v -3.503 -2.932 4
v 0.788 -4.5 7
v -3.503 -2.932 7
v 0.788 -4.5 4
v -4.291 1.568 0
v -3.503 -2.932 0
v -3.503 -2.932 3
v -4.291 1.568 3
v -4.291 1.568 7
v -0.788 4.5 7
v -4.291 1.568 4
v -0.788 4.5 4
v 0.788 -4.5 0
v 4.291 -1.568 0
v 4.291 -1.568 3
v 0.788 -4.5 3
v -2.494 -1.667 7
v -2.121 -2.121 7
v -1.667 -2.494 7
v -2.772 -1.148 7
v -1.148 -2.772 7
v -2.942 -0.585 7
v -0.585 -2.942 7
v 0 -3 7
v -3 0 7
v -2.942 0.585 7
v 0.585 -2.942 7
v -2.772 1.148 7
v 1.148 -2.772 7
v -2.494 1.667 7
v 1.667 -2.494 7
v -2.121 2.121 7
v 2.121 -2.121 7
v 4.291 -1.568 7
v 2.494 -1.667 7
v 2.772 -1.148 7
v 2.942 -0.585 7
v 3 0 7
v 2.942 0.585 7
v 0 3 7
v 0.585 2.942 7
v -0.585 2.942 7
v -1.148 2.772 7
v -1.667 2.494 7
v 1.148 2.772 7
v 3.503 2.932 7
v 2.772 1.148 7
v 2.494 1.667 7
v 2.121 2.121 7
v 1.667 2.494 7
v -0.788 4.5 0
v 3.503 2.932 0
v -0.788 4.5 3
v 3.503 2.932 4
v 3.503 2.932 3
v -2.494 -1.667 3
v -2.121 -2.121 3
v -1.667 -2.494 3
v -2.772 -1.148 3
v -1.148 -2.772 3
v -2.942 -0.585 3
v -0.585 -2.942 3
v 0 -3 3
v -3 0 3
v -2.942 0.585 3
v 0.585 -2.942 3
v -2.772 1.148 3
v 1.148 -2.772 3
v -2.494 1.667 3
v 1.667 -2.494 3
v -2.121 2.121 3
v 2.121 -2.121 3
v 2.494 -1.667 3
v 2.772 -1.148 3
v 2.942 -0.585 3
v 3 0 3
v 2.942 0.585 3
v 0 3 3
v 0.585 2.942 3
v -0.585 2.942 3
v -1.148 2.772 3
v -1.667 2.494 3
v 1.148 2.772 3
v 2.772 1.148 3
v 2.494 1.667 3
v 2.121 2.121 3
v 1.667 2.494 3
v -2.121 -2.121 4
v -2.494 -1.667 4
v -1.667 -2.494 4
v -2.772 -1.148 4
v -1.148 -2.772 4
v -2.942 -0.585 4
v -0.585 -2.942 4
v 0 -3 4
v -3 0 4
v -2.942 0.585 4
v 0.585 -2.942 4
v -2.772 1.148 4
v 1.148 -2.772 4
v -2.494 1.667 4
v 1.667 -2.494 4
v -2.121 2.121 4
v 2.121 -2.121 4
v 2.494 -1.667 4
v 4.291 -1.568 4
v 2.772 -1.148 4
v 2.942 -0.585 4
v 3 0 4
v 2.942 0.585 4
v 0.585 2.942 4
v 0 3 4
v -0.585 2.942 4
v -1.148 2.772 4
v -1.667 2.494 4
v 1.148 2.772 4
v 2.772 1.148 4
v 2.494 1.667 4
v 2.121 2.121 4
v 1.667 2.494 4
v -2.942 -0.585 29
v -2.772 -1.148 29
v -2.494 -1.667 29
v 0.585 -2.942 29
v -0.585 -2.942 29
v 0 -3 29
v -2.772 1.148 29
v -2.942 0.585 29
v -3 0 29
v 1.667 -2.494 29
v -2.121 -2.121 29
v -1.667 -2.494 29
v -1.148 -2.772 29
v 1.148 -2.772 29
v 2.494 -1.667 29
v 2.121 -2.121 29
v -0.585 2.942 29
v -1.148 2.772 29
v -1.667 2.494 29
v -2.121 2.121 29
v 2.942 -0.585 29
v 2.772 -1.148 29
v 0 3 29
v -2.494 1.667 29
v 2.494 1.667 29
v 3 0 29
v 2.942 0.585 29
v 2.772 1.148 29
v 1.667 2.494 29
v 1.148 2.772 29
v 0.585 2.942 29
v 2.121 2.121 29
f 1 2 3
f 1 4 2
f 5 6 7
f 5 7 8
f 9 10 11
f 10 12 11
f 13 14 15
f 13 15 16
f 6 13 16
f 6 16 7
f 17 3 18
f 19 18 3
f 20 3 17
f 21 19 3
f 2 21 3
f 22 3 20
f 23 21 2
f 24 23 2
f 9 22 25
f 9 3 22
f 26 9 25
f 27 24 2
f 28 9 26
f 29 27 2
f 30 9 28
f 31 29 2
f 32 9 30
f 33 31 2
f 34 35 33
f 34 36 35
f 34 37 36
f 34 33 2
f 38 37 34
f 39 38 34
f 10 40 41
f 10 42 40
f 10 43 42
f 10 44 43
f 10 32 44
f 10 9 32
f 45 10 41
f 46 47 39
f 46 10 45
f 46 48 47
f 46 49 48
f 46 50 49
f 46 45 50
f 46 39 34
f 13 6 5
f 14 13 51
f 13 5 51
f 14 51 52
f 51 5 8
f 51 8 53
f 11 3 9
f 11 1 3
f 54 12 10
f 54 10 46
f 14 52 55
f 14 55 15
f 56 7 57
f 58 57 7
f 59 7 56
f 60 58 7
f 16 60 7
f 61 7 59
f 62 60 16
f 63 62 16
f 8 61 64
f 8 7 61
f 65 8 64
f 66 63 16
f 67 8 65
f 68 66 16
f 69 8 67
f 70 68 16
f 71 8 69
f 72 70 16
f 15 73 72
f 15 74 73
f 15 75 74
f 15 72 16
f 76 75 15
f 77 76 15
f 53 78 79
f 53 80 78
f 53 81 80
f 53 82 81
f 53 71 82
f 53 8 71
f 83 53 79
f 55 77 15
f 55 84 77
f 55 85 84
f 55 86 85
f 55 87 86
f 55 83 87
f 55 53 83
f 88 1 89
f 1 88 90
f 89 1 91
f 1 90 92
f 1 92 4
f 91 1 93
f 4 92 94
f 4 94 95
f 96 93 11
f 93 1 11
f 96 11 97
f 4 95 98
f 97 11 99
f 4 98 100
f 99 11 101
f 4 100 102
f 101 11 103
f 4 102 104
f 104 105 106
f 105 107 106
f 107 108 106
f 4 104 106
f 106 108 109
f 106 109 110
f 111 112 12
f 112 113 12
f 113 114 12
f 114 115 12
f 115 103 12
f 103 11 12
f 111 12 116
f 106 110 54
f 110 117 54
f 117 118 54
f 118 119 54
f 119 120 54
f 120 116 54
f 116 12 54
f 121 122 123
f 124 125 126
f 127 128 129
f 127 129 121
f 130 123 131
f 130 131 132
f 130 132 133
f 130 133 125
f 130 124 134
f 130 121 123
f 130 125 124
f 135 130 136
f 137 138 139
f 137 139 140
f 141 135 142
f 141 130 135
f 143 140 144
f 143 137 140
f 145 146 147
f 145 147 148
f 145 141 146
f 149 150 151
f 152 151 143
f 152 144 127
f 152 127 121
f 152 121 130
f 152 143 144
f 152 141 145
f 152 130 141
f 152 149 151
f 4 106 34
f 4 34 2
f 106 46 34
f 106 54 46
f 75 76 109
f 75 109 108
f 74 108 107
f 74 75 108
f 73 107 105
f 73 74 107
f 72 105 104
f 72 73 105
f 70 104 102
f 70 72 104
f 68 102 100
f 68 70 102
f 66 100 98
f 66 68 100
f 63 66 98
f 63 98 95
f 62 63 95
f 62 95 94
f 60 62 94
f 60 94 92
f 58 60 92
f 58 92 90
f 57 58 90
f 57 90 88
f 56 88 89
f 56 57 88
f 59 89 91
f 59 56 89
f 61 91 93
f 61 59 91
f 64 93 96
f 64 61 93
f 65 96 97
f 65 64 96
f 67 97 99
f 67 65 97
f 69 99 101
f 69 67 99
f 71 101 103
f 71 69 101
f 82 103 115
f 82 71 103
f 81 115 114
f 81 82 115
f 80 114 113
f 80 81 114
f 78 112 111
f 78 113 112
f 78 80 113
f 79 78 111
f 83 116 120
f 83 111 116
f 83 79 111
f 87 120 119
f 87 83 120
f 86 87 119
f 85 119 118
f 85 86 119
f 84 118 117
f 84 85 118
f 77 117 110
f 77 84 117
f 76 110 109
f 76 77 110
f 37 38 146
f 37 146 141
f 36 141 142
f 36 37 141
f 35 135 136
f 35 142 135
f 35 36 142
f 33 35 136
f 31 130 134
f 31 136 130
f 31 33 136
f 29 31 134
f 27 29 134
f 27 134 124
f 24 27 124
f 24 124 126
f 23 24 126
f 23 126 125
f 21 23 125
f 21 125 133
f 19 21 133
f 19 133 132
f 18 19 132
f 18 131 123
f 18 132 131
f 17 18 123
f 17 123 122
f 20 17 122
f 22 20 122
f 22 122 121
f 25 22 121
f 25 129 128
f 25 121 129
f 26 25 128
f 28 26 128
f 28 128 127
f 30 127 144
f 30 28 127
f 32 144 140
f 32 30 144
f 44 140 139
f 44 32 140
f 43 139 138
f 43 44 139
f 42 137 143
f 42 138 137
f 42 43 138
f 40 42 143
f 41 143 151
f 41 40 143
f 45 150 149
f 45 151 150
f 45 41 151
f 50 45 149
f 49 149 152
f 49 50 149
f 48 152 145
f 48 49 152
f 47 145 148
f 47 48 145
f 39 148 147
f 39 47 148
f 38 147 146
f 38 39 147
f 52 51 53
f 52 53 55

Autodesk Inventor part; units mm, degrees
ref_plane "YZ Plane" through (0, 0, 0) normal (1, 0, 0) x (0, 1, 0)
ref_plane "XZ Plane" through (0, 0, 0) normal (0, 1, 0) x (-1, 0, 0)
ref_plane "XY Plane" through (0, 0, 0) normal (0, 0, 1) x (1, 0, 0)
sketch "Sketch1" plane through (0, 0, 0) normal (0, 0, 1) x (1, 0, 0)
  line L0 (-0.7879, 4.5) -> (3.5032, 2.9324)
  line L1 (3.5032, 2.9324) -> (4.2911, -1.5676)
  line L2 (4.2911, -1.5676) -> (0.7879, -4.5)
  line L3 (0.7879, -4.5) -> (-3.5032, -2.9324)
  line L4 (-3.5032, -2.9324) -> (-4.2911, 1.5676)
  line L5 (-4.2911, 1.5676) -> (-0.7879, 4.5)
  point P0 (0, 0)
  point P1 (0, 0)
  dimension "d0" = 9
extrude "Extrusion1" add sketch "Sketch1" along normal blind 3
sketch "Sketch2" plane through (0, 0, 3) normal (0, 0, 1) x (1, 0, 0)
  circle A0 centre (0, 0) radius 3
  dimension "d3" = 6
extrude "Extrusion2" add sketch "Sketch2" along normal blind 1
sketch "Sketch3" plane through (0, 0, 4) normal (0, 0, 1) x (1, 0, 0)
  line L0 (-0.7879, 4.5) -> (-4.2911, 1.5676) projected
  line L1 (-0.7879, 4.5) -> (3.5032, 2.9324)
  line L2 (3.5032, 2.9324) -> (4.2911, -1.5676)
  line L3 (4.2911, -1.5676) -> (0.7879, -4.5)
  line L4 (0.7879, -4.5) -> (-3.5032, -2.9324)
  line L5 (-3.5032, -2.9324) -> (-4.2911, 1.5676)
  line L6 (-4.2911, 1.5676) -> (-0.7879, 4.5)
  point P0 (0, 0)
  point P1 (0, 0)
extrude "Extrusion3" add sketch "Sketch3" along normal blind 3
sketch "Sketch4" plane through (0, 0, 7) normal (0, 0, 1) x (1, 0, 0)
  circle A0 centre (0, 0) radius 3
  dimension "d8" = 6
extrude "Extrusion4" add sketch "Sketch4" along normal blind 22
thread "Thread1" size "M6x1" class "6g" standard "ANSI Metric M Profile" full length
properties part number "HUDOSN-1-54B"
